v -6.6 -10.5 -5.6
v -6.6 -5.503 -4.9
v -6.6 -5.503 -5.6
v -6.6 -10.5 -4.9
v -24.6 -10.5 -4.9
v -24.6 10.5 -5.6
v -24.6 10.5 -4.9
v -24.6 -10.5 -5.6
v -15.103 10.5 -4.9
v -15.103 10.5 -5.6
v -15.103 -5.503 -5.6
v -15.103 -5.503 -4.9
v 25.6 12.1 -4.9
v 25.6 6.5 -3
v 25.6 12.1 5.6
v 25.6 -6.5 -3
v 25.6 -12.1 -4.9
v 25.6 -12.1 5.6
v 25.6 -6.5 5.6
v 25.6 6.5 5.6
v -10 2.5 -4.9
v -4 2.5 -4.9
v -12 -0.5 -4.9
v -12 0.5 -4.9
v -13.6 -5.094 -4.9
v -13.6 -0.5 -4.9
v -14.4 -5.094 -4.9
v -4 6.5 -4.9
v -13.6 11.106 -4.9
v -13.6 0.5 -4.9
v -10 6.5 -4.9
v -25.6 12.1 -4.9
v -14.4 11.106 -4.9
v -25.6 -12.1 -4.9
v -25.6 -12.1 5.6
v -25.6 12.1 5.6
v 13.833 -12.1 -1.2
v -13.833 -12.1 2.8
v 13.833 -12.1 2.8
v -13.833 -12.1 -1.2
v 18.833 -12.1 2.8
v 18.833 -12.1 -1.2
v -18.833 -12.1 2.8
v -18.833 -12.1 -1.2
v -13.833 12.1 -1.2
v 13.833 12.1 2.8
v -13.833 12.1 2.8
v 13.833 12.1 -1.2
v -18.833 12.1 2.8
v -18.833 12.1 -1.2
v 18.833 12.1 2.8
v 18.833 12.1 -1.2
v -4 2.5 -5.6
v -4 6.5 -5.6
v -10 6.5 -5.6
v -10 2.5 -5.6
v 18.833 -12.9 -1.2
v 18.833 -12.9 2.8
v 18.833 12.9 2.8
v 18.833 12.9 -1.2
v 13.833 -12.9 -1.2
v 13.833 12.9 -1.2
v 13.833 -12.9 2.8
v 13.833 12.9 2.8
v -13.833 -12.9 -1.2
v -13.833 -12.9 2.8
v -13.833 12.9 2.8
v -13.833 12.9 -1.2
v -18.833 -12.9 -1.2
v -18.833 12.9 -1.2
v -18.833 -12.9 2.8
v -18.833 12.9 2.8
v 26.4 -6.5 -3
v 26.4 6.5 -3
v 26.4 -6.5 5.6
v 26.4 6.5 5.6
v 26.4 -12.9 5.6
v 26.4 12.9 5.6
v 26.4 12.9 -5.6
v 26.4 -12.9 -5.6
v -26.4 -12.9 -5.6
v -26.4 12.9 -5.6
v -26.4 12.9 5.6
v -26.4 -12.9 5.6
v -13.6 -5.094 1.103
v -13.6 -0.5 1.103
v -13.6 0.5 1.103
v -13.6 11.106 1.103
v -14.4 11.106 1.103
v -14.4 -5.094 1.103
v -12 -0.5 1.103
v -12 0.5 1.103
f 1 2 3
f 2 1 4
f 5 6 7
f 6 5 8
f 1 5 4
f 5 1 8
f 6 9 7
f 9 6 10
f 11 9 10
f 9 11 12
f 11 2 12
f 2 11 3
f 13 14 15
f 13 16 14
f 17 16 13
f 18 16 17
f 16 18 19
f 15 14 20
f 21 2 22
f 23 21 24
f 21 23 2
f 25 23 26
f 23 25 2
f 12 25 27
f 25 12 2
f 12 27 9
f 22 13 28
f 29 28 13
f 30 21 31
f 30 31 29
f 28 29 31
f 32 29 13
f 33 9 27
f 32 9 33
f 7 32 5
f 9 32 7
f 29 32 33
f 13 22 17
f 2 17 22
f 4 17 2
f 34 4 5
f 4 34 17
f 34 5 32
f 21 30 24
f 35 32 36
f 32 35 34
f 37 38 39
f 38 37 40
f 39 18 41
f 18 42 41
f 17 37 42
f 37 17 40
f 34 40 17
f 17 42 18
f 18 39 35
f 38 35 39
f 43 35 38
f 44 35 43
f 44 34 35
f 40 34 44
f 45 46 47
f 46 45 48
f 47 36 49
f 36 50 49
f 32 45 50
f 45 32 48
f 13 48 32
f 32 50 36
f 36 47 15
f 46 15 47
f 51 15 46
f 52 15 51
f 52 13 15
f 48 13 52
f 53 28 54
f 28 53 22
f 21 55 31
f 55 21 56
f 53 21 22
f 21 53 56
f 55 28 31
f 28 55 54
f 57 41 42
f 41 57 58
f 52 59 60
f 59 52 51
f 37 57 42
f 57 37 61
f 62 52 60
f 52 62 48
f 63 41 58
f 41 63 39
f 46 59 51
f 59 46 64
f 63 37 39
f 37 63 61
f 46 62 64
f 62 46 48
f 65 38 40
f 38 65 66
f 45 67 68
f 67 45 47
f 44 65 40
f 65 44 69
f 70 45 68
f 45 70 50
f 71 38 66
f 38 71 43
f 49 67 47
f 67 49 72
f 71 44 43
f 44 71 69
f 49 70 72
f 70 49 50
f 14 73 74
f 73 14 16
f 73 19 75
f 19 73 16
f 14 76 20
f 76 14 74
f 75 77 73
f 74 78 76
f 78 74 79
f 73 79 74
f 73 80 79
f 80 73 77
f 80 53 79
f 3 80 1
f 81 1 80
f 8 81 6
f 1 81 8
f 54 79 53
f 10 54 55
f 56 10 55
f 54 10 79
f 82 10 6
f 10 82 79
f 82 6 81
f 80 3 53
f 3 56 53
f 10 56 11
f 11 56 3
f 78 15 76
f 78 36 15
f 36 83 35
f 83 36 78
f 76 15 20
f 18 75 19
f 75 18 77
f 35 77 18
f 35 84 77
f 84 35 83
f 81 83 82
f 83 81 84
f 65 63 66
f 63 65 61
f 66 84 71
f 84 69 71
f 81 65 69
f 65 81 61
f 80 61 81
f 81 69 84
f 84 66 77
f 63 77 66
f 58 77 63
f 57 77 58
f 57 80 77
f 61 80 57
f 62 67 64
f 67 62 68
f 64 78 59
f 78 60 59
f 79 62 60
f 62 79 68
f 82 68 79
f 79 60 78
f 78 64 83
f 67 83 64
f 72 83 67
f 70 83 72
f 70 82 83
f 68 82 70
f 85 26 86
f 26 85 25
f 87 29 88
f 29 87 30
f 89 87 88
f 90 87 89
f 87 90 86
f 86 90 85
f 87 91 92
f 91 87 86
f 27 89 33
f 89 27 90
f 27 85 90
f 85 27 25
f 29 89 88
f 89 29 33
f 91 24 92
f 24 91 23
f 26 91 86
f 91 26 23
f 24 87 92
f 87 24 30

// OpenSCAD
// file: Dimensions.scad
overlap=0.006;

BoxInnerLength=49;
BoxInnerWidth=22;
BoxInnerHeight=8-1+1;

UsbLength=20;
UsbWidth=13;
UsbHeight=6;
UsbDeltaZ=1;

Wall=0.8;

clipX=4;
clipY=1;
clipZ=4;
// main file
include <Dimensions.scad>

delta=0.3;
CapInnerLength=BoxInnerLength+Wall*2+delta*2;
CapInnerWidth=BoxInnerWidth+Wall*2+delta*2;
CapInnerHeight=BoxInnerHeight+Wall*2;

CapHoleX=18;
CapHoleY=21;

rotate([180,0,0])
createUsbAspCapModel();

module createUsbAspCapModel(){
    difference()
    {
        cube([CapInnerLength+Wall*2,CapInnerWidth+Wall*2,CapInnerHeight+Wall*2],center=true);

        union()
        {
            translate([0,0,-Wall/2])
            cube([CapInnerLength,CapInnerWidth,CapInnerHeight+1],center=true);

            translate([CapHoleX/2-CapInnerLength/2+1,0,0])
            difference()
            {
                cube([CapHoleX,CapHoleY,20],center=true);

                translate([CapHoleX/4+0.5,-5/2,0])
                cube([CapHoleX/2+overlap,CapHoleY-5+overlap,20+overlap],center=true);
            }

            translate([-7,-4.5,0])
            cube([6,4,20],center=true);

            translate([BoxInnerLength/3,BoxInnerWidth/2,clipZ/2+BoxInnerHeight/2-2-CapInnerHeight/2])
            cube([clipX+1,clipY+50,clipZ],center=true);

            translate([-BoxInnerLength/3,BoxInnerWidth/2,clipZ/2+BoxInnerHeight/2-2-CapInnerHeight/2])
            cube([clipX+1,clipY+50,clipZ],center=true);

            usbCutZ=20;
            translate([20,0,-usbCutZ/2+BoxInnerHeight/2-1])
            cube(size=[UsbLength,UsbWidth,usbCutZ],center=true);
        }
    }

    translate([-14,-7/2+1/2-overlap,-Wall+3])
    cube([Wall,CapInnerWidth-7-1,CapInnerHeight-3+overlap],center=true);

    translate([-13,0,-Wall+3])
    cube([2,1,CapInnerHeight-3+overlap],center=true);
}
